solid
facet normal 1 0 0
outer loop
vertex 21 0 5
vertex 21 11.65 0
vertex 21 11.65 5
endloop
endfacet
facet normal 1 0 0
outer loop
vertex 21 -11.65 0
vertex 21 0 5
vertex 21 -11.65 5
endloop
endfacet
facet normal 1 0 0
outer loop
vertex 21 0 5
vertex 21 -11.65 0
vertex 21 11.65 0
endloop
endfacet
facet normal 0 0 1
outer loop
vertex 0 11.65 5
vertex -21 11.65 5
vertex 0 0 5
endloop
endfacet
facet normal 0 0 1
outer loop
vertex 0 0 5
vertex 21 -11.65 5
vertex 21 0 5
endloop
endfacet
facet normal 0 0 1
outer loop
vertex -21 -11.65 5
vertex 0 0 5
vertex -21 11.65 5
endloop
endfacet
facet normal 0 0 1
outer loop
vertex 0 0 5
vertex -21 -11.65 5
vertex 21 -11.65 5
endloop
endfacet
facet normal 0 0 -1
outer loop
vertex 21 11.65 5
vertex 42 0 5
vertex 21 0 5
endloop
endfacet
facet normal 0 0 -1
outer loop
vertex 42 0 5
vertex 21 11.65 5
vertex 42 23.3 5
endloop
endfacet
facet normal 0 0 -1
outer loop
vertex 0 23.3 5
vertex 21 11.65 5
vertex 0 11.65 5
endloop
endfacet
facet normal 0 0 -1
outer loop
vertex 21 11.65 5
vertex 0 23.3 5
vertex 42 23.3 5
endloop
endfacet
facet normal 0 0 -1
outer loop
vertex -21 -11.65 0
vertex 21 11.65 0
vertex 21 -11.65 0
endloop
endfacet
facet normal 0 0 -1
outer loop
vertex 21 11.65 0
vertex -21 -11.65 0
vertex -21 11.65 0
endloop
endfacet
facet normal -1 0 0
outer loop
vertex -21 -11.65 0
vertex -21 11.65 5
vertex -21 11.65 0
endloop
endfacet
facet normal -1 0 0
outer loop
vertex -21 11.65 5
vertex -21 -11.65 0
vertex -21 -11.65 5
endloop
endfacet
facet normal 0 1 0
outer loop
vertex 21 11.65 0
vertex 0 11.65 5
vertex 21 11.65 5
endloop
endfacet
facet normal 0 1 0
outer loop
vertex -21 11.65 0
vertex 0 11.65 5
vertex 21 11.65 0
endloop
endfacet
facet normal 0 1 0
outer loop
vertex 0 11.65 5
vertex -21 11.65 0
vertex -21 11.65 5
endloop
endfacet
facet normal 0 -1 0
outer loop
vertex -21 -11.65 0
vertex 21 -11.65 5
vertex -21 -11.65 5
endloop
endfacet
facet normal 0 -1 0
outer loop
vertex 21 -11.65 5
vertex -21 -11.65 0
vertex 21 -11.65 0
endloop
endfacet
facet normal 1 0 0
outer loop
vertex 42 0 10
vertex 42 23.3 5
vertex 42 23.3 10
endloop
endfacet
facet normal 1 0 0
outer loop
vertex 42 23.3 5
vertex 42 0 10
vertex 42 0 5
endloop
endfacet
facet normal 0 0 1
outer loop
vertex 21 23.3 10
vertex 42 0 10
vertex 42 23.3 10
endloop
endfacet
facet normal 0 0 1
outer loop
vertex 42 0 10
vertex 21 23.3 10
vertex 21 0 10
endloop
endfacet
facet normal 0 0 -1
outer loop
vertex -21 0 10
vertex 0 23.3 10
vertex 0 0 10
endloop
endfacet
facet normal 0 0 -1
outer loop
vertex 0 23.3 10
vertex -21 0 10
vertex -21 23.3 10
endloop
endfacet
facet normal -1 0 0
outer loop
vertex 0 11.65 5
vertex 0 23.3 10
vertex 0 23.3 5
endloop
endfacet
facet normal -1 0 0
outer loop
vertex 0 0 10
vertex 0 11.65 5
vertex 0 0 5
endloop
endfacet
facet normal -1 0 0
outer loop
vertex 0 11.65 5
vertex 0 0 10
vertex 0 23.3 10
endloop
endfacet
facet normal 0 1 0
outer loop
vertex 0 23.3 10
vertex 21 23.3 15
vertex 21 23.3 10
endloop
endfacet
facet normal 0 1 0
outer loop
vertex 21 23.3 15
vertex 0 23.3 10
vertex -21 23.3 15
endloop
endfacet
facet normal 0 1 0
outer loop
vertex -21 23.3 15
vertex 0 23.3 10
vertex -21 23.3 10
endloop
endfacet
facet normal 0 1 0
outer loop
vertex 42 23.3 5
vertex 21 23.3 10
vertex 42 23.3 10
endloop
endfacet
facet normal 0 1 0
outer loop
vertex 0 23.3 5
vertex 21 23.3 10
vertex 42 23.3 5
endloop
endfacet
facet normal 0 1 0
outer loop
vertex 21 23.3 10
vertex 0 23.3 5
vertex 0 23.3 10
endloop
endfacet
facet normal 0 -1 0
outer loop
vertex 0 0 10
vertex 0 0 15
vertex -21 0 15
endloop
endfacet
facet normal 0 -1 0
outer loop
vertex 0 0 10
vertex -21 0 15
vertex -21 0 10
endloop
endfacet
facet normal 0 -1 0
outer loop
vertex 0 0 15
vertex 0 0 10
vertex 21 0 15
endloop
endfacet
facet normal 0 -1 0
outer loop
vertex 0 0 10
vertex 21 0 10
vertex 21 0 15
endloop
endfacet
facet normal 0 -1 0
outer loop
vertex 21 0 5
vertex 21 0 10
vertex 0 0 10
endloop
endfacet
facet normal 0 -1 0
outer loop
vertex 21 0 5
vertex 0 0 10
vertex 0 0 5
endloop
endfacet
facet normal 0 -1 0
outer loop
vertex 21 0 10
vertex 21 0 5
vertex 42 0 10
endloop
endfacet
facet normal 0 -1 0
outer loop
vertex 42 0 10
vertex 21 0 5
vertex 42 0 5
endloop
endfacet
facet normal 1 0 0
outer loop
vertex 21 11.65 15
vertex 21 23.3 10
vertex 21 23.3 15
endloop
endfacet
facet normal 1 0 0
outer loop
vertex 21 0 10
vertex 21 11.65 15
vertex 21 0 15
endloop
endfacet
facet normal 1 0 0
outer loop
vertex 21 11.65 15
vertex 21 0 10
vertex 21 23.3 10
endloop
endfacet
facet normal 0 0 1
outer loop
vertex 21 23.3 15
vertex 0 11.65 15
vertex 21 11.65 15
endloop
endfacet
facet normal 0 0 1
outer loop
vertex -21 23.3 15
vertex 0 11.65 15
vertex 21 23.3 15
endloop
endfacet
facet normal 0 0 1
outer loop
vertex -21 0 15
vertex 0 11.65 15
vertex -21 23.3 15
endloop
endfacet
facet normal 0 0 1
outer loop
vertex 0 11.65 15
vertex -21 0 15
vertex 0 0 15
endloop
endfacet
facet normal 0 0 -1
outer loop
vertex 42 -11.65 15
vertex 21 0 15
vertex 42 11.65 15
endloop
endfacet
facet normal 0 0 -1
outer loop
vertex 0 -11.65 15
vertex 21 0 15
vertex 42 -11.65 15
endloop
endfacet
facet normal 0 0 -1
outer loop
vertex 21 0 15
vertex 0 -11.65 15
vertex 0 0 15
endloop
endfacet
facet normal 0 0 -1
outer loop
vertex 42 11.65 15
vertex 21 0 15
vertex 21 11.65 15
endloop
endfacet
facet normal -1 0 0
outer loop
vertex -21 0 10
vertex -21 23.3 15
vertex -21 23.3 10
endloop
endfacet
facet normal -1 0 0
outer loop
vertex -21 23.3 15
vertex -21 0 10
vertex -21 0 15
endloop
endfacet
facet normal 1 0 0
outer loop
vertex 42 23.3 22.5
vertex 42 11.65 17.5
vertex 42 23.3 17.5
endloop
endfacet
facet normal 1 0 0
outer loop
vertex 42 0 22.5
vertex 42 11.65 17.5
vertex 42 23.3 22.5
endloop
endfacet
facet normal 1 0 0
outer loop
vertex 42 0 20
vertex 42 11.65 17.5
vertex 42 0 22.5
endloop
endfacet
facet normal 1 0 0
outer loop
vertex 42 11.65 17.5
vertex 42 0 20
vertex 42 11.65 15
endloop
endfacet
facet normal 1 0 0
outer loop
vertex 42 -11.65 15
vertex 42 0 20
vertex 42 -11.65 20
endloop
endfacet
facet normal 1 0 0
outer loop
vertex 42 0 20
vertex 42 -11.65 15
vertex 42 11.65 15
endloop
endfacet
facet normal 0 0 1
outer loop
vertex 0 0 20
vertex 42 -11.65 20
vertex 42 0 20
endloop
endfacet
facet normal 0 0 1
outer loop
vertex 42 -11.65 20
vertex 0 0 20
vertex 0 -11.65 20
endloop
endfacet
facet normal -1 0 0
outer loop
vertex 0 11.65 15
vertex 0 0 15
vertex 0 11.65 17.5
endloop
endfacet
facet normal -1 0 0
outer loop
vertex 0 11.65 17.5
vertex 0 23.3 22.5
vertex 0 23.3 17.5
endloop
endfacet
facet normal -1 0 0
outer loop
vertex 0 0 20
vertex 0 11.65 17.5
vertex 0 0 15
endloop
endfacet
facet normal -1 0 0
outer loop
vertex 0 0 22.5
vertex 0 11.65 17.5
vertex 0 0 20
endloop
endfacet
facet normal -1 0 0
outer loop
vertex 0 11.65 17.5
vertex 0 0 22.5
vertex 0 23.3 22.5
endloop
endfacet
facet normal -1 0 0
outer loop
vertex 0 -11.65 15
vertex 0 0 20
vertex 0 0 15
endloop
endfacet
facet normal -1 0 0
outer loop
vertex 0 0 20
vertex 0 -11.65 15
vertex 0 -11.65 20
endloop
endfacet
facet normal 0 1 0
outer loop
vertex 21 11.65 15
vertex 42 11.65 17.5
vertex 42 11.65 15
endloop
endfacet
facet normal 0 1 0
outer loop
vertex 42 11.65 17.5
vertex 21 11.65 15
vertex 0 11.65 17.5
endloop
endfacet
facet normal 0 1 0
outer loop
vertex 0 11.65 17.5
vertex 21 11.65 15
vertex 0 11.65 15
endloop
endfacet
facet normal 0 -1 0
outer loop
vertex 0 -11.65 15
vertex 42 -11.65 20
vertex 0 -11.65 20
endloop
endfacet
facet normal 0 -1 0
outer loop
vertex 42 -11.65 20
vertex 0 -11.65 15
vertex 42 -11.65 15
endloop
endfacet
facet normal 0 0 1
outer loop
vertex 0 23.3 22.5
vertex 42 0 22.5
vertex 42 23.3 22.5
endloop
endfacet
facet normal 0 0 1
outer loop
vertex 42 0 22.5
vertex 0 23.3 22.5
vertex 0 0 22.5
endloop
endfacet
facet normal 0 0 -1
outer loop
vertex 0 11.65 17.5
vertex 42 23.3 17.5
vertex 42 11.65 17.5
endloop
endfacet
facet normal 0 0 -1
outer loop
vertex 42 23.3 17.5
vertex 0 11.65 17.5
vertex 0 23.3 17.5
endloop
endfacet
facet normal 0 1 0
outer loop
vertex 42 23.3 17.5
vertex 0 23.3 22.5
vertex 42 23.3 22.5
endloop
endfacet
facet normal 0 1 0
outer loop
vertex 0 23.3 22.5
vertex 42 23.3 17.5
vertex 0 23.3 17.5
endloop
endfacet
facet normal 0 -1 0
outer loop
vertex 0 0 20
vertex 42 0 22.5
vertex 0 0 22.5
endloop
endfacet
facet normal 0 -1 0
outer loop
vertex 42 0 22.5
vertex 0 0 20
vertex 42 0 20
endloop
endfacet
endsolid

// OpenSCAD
module CubeExample(){
  union(){
    translate([-21, -11.65, 0])color("yellow")cube([42, 23.3, 5.0]);
    translate([0, 0, 0])translate([0, 0, 5])color("orange")cube([42, 23.3, 5.0]);
    translate([-21, 0, 0])translate([0, 0, 10])color("red")cube([42, 23.3, 5.0]);
    translate([0, -11.65, 0])translate([0, 0, 15])color("pink")cube([42, 23.3, 5.0]);
    translate([0, 0, -2.5])translate([0, 0, 20])color("purple")cube([42, 23.3, 5.0]);
  }
}
$fn=64;
CubeExample();
